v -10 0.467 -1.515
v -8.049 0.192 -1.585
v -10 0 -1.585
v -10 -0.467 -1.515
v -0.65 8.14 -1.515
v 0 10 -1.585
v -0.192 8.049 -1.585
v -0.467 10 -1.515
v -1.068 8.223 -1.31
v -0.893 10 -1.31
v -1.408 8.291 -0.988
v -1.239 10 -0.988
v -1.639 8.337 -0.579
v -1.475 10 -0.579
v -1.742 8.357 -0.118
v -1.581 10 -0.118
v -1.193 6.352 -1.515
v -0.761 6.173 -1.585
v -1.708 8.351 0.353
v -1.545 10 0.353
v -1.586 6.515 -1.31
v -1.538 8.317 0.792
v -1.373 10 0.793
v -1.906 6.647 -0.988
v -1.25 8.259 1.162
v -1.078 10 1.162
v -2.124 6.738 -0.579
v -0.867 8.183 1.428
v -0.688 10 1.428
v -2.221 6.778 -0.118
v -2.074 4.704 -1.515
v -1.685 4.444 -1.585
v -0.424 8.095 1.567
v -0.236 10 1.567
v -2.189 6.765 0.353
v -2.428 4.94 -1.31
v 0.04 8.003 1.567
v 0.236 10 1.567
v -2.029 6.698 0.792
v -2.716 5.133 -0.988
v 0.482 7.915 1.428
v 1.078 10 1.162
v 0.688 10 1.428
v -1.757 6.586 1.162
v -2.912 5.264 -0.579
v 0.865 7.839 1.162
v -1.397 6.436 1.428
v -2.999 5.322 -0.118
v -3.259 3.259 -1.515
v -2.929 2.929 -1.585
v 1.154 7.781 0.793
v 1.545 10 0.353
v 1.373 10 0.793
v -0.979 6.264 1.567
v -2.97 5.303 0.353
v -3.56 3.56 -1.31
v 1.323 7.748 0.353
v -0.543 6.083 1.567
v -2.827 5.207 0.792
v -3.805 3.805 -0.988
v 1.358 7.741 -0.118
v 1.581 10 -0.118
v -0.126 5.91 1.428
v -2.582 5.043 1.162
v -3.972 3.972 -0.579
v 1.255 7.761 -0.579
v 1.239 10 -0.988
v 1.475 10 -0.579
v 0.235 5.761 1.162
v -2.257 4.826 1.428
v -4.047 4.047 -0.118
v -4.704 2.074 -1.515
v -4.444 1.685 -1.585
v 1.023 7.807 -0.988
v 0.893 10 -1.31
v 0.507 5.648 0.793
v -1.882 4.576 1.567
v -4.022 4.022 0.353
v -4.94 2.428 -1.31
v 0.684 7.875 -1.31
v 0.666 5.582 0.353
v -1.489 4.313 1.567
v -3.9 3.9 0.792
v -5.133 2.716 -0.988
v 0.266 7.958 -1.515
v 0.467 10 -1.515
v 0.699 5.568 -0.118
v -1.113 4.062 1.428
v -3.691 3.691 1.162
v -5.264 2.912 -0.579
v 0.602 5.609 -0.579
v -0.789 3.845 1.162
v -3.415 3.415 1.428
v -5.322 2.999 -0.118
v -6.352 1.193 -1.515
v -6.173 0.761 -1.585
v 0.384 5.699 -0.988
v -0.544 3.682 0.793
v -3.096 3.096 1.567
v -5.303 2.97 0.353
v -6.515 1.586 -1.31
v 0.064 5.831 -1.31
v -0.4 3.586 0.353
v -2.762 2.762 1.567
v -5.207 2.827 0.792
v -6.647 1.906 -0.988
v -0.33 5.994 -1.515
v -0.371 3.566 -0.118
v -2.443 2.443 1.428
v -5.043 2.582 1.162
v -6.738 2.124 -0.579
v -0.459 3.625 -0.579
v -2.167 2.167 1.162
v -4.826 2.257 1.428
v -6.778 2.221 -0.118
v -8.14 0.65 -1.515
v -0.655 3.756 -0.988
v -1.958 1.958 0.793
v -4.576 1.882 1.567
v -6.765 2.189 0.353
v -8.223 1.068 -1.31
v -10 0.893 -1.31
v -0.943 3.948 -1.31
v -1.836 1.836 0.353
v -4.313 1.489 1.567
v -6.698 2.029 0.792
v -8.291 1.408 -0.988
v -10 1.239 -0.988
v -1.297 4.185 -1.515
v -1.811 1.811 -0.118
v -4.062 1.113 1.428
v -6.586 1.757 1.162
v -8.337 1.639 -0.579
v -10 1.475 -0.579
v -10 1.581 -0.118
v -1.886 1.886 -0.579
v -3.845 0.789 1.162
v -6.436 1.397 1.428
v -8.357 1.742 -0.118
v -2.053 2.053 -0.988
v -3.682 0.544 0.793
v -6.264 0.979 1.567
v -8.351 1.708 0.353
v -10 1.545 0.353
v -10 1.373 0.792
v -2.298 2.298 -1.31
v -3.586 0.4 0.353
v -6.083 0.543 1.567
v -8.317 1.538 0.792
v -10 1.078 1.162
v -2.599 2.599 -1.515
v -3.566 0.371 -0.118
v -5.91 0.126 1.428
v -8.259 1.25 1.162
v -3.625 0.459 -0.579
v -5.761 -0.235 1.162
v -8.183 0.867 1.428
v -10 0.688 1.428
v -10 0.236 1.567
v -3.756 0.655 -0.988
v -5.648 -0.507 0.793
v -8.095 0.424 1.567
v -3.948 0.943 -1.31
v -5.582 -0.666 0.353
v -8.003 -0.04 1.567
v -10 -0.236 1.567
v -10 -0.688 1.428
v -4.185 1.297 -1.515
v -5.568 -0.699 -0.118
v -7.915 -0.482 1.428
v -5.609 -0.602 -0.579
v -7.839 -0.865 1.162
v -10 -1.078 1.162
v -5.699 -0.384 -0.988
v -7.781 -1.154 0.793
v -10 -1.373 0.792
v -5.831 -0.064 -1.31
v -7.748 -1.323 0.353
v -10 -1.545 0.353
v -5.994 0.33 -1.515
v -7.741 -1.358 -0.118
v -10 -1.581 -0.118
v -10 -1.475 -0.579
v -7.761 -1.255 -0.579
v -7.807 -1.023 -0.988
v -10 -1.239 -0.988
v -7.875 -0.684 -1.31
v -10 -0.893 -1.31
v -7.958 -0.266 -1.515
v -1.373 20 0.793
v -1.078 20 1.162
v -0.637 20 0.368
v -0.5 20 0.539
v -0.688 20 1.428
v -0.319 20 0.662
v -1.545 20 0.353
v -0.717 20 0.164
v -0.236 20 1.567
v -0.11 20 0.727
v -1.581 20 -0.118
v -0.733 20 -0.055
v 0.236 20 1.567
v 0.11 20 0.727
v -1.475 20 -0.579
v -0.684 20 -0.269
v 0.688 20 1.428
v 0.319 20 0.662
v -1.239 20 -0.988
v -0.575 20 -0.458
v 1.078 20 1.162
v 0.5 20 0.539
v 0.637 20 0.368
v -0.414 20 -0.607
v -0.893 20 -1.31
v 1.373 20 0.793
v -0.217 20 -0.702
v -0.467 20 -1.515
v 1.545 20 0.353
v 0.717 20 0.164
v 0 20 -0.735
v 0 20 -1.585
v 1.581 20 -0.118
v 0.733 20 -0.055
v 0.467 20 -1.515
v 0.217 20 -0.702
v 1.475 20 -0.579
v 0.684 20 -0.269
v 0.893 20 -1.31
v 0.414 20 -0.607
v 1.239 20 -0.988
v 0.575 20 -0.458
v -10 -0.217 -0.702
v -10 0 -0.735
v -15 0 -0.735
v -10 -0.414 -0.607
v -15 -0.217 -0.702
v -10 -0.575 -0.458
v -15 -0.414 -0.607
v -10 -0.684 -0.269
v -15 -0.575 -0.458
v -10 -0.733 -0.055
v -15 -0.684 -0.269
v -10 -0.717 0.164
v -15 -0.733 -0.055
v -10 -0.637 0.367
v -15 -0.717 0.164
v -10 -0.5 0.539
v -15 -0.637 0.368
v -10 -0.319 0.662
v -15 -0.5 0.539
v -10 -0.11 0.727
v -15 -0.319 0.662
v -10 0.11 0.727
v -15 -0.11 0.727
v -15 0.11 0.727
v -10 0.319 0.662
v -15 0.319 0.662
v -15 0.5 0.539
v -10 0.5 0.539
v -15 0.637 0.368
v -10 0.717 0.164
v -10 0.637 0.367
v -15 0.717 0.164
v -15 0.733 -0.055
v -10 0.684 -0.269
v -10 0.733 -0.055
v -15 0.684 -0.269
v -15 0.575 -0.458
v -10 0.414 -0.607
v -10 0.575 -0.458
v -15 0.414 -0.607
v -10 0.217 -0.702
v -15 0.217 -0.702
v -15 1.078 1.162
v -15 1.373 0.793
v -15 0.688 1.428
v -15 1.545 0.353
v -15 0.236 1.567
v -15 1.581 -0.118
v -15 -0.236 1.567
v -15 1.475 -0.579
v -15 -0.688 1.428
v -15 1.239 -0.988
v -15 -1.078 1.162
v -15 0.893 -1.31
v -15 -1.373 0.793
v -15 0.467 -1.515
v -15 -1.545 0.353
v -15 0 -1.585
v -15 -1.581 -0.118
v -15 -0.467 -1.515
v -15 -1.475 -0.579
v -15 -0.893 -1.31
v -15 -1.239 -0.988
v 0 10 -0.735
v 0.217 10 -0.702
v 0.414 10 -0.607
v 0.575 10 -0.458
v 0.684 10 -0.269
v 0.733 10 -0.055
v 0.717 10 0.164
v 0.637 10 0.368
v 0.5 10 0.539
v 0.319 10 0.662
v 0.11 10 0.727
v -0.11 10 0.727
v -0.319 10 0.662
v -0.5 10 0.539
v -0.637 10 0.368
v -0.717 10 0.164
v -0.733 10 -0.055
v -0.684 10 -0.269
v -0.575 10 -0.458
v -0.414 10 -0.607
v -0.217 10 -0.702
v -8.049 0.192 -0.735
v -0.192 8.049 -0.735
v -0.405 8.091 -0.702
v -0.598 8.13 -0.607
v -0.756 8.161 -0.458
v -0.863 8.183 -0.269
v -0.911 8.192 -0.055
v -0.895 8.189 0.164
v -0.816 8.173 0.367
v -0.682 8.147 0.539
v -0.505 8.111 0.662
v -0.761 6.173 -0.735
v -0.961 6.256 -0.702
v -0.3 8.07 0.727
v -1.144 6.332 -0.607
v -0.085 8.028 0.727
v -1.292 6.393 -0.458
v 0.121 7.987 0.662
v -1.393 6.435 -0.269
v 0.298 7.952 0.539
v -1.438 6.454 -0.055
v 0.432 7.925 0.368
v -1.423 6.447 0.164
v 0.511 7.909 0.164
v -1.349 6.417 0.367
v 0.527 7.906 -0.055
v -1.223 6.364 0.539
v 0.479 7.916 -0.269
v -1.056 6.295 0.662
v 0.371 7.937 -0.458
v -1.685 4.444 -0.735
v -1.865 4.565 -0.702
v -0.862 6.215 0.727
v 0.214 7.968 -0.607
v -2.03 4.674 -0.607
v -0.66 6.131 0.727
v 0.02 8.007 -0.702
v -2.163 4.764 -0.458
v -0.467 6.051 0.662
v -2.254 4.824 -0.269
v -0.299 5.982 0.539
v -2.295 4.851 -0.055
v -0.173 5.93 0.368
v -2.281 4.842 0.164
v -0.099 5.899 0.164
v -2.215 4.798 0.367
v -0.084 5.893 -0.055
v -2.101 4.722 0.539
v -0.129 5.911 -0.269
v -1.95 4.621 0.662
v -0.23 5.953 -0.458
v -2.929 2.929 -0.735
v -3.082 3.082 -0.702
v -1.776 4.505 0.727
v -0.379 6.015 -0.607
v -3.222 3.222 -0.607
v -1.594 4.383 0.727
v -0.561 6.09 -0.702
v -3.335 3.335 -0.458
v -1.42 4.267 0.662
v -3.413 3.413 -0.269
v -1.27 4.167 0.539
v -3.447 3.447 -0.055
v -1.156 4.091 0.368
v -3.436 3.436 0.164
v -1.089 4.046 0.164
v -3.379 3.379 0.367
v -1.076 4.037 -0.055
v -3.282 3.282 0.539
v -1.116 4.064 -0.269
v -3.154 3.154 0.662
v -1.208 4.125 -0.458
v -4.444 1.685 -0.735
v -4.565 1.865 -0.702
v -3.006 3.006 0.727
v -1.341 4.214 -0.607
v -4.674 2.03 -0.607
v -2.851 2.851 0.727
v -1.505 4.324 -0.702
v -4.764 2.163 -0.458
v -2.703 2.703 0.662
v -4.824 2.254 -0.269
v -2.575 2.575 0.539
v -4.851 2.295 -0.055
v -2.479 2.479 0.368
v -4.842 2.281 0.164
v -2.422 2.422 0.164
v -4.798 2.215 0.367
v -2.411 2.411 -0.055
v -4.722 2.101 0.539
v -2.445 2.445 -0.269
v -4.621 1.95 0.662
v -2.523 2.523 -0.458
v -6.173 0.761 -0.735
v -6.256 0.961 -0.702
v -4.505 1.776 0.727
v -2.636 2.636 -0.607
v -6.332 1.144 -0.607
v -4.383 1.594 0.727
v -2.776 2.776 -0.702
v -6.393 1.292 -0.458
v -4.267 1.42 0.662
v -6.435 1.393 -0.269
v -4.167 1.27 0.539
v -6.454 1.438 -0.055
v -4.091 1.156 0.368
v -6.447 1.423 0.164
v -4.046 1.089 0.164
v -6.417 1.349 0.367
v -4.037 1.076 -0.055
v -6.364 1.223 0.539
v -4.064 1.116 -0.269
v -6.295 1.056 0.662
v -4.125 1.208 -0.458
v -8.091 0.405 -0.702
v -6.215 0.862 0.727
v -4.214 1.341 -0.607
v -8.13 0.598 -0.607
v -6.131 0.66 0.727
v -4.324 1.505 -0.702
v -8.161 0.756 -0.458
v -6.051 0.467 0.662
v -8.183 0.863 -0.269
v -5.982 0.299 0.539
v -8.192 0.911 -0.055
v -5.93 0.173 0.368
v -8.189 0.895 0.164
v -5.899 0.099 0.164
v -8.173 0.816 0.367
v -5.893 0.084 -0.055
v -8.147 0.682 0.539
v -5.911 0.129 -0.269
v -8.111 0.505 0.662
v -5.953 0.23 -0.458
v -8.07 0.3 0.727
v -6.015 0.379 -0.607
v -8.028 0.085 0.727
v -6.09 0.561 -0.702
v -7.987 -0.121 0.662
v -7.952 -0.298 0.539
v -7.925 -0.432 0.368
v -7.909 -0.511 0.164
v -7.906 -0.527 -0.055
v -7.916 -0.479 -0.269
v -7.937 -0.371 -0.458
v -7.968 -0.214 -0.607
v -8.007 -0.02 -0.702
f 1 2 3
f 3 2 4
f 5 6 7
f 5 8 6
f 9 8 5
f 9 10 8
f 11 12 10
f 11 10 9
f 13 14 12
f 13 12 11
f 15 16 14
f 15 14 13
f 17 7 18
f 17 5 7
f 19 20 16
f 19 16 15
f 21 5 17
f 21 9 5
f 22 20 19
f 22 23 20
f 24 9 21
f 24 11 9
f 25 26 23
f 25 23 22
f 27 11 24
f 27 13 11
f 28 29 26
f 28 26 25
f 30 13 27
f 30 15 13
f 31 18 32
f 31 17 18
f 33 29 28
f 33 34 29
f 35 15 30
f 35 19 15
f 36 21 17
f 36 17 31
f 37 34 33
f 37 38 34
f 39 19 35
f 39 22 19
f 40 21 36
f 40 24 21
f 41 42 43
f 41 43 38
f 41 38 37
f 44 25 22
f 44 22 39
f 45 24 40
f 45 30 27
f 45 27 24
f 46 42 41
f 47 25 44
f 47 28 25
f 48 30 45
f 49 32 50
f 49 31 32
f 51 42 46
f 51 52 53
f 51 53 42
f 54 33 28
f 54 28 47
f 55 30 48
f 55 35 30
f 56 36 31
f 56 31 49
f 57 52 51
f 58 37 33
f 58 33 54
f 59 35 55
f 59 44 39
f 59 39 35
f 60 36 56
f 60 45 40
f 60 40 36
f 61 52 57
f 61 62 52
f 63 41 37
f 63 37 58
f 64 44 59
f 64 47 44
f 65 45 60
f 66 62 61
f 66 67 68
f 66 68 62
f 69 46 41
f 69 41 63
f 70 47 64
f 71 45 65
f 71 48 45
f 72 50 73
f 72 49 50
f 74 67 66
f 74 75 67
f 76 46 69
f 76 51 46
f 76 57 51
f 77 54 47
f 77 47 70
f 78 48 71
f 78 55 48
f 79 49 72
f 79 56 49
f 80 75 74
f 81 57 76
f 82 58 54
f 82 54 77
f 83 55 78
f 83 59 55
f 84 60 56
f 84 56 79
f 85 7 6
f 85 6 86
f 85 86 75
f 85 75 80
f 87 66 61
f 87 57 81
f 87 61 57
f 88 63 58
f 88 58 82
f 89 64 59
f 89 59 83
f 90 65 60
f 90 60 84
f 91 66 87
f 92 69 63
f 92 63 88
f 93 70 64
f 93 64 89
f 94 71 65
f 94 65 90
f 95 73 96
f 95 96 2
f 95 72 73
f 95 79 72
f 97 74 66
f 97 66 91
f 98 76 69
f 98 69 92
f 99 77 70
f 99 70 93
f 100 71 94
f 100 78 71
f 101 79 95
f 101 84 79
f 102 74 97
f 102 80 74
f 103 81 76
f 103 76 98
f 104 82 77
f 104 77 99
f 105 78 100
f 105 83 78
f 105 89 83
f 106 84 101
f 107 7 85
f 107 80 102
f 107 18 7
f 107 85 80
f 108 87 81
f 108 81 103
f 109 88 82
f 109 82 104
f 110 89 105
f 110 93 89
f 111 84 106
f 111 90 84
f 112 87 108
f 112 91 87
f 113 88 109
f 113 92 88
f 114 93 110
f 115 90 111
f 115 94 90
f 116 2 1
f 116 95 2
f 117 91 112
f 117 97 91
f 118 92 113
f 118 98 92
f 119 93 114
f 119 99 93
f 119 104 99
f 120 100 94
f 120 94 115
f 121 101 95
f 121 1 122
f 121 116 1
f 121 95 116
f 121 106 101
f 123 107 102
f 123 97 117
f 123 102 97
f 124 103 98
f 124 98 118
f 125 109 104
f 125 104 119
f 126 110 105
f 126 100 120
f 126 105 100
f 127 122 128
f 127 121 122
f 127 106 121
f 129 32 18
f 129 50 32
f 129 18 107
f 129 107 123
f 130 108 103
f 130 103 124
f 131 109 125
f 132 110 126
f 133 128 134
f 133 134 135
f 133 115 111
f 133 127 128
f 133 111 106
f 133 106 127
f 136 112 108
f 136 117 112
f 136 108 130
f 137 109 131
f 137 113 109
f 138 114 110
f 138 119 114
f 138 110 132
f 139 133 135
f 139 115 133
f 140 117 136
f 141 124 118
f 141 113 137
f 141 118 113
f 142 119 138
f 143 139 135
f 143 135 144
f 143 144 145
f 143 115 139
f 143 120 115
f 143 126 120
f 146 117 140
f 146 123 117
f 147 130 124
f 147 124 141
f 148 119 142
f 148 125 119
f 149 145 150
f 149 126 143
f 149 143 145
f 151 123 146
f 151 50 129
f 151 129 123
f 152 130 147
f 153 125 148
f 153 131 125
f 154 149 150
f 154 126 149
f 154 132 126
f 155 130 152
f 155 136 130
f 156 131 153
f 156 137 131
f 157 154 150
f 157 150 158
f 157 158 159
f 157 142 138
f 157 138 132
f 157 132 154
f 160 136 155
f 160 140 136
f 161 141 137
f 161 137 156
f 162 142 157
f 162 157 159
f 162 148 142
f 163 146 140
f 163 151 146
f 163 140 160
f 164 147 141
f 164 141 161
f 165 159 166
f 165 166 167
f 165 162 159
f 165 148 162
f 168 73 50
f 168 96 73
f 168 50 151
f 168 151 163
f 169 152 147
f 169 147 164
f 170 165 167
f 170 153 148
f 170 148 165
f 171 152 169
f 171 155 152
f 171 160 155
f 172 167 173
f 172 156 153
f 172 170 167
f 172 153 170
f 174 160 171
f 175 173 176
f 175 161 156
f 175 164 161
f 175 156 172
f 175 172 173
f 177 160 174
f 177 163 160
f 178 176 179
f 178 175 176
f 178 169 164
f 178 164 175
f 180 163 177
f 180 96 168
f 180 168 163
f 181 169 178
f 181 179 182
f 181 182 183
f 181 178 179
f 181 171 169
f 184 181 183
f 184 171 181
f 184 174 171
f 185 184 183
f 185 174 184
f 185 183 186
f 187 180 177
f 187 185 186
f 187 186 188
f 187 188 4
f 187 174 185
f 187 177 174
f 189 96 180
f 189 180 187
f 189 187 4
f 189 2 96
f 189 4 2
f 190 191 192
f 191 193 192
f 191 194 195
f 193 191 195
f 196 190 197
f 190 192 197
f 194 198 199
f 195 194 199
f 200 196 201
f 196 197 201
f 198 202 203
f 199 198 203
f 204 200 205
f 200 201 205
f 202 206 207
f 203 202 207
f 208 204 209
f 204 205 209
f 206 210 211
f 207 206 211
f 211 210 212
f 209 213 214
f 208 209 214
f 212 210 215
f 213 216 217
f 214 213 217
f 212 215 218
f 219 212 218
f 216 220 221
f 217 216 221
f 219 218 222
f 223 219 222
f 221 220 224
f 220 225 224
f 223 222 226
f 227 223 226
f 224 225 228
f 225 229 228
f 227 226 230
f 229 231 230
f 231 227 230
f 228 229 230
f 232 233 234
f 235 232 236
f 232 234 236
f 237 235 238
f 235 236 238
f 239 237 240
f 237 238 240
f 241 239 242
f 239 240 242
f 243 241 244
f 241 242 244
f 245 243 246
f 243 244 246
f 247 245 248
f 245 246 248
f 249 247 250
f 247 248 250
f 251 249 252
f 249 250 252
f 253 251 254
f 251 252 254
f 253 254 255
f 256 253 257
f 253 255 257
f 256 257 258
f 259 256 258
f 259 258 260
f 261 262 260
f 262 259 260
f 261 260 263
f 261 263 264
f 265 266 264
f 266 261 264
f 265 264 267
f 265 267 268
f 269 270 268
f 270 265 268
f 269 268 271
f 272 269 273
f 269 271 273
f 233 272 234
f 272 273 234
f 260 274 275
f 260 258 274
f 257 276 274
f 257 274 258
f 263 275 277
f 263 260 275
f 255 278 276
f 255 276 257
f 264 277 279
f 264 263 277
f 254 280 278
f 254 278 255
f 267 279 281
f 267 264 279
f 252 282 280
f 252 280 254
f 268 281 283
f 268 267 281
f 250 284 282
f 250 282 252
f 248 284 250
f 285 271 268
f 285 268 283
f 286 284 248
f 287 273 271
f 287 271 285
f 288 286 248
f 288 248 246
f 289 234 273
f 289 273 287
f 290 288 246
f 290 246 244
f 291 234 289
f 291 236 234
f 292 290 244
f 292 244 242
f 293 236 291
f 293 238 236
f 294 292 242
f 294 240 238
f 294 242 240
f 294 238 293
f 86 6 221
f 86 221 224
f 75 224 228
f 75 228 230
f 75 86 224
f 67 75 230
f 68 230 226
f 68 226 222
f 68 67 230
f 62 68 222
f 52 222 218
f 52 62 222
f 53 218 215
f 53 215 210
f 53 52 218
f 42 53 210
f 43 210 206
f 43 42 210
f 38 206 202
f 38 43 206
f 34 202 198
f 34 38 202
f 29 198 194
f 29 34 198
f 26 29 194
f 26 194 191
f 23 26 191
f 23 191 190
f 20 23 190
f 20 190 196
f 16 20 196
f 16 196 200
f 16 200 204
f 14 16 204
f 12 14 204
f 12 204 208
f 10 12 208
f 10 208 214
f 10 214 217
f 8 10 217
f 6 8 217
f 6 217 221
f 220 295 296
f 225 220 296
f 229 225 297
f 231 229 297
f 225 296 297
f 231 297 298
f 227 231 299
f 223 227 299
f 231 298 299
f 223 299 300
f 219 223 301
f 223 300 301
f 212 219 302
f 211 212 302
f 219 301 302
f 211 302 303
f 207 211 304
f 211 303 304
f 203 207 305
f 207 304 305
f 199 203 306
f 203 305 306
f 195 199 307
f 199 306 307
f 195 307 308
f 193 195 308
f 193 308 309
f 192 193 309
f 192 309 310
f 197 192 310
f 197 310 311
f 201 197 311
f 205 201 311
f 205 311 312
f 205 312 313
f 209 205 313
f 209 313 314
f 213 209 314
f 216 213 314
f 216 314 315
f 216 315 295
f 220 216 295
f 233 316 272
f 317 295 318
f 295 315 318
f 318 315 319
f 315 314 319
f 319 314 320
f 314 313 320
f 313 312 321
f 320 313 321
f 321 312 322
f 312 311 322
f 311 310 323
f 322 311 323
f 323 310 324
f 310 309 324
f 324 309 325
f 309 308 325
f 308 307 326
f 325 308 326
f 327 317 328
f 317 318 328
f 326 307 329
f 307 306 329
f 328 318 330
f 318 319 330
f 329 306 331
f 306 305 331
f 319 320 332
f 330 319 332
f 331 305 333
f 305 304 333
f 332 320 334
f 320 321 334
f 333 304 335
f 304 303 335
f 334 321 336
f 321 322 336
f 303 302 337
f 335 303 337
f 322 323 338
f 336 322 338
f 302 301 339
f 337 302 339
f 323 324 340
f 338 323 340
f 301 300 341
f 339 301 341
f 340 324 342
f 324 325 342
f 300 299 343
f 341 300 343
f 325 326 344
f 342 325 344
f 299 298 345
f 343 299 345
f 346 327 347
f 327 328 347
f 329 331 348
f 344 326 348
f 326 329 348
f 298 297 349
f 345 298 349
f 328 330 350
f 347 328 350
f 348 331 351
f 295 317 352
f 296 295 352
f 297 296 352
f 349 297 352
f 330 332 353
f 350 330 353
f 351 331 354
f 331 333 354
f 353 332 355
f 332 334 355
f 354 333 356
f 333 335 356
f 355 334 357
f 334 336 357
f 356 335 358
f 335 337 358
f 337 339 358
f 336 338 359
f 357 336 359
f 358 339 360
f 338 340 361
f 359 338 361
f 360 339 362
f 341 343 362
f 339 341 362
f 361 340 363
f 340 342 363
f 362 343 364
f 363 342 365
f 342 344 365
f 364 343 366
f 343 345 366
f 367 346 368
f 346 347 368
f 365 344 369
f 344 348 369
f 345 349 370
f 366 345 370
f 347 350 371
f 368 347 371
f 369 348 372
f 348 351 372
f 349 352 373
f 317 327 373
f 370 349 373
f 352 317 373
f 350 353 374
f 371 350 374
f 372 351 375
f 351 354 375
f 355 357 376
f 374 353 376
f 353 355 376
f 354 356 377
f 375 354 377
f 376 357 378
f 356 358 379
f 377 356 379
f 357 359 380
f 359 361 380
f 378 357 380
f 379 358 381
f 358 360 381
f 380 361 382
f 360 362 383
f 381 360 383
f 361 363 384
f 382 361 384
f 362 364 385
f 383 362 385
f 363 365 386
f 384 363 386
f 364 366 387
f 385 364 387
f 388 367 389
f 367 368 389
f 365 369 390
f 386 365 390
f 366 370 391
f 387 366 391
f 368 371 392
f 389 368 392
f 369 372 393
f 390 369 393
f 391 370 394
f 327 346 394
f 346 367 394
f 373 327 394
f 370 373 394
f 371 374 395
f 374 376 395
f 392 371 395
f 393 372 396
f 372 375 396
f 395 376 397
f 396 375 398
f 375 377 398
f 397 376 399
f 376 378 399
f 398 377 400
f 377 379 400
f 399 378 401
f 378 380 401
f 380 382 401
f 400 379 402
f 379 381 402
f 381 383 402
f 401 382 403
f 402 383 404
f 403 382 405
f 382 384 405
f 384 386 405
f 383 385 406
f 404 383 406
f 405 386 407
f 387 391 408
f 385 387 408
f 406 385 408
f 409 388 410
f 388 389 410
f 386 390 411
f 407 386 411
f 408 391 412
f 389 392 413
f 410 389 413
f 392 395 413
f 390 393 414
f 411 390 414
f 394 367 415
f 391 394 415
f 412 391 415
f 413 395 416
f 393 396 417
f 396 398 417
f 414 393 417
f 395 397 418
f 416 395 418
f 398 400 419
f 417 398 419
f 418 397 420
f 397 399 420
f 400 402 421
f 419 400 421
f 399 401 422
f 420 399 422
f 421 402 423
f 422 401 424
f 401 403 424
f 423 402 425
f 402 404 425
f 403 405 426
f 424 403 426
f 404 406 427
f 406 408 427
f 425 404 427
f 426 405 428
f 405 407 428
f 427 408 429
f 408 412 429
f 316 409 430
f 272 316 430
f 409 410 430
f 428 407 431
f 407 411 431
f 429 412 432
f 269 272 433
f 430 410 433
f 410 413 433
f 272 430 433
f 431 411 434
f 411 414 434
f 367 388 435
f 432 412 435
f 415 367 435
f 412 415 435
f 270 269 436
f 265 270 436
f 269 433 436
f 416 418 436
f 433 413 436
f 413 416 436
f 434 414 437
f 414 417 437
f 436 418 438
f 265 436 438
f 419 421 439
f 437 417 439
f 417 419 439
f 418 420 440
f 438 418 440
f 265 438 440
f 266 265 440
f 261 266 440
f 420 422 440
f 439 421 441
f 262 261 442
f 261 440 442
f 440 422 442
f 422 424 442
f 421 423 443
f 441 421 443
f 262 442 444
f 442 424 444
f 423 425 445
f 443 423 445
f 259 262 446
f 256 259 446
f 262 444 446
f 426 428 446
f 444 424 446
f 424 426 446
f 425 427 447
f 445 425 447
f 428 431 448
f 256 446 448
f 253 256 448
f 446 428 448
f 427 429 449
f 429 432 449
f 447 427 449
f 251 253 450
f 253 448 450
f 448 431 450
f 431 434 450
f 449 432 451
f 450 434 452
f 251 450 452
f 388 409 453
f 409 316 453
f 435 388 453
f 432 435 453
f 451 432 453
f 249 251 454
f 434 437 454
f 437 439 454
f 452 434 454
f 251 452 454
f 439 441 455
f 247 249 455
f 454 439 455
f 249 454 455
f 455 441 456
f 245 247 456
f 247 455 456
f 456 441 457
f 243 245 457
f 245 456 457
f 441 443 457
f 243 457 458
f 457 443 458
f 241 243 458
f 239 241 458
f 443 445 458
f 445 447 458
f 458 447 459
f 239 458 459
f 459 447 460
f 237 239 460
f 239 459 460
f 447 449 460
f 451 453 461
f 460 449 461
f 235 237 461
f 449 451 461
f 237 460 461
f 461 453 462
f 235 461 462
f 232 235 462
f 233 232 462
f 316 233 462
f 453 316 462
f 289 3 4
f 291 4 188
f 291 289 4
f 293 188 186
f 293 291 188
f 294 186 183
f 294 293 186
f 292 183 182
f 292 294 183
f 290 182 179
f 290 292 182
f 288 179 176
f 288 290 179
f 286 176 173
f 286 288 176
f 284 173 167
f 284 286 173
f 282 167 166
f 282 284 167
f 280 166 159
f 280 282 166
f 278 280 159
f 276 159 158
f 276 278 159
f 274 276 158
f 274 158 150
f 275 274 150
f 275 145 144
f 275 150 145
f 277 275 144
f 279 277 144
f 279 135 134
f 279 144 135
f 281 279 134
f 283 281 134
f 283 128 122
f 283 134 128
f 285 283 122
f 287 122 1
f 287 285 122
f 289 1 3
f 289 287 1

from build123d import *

# Parameters (mm, degrees)
SWEEP_SOTTILE1_PROFILE_R   = 1.585
SWEEP_SOTTILE1_PROFILE_R_2 = 0.735


with BuildPart() as part:
    # Sweep-Sottile1: sweep along a curve in space
    with BuildLine() as sweep_sottile1_path:
        Line((0, 20, 0), (0, 10, 0))
        ThreePointArc((0, 10, 0), (-2.928932188, 2.928932188, 0), (-10, 0, 0))
        Line((-10, 0, 0), (-15, 0, 0))
    # Sweep-Sottile1 profile (on start of the path) → Sweep-Sottile1 (sweep)
    with BuildSketch(Plane(origin=(0, 20, 0), x_dir=(0, 0, -1), z_dir=(0, -1, 0))):
        Circle(SWEEP_SOTTILE1_PROFILE_R)
        Circle(SWEEP_SOTTILE1_PROFILE_R_2, mode=Mode.SUBTRACT)
    sweep(path=sweep_sottile1_path.line)


solid = part.part
